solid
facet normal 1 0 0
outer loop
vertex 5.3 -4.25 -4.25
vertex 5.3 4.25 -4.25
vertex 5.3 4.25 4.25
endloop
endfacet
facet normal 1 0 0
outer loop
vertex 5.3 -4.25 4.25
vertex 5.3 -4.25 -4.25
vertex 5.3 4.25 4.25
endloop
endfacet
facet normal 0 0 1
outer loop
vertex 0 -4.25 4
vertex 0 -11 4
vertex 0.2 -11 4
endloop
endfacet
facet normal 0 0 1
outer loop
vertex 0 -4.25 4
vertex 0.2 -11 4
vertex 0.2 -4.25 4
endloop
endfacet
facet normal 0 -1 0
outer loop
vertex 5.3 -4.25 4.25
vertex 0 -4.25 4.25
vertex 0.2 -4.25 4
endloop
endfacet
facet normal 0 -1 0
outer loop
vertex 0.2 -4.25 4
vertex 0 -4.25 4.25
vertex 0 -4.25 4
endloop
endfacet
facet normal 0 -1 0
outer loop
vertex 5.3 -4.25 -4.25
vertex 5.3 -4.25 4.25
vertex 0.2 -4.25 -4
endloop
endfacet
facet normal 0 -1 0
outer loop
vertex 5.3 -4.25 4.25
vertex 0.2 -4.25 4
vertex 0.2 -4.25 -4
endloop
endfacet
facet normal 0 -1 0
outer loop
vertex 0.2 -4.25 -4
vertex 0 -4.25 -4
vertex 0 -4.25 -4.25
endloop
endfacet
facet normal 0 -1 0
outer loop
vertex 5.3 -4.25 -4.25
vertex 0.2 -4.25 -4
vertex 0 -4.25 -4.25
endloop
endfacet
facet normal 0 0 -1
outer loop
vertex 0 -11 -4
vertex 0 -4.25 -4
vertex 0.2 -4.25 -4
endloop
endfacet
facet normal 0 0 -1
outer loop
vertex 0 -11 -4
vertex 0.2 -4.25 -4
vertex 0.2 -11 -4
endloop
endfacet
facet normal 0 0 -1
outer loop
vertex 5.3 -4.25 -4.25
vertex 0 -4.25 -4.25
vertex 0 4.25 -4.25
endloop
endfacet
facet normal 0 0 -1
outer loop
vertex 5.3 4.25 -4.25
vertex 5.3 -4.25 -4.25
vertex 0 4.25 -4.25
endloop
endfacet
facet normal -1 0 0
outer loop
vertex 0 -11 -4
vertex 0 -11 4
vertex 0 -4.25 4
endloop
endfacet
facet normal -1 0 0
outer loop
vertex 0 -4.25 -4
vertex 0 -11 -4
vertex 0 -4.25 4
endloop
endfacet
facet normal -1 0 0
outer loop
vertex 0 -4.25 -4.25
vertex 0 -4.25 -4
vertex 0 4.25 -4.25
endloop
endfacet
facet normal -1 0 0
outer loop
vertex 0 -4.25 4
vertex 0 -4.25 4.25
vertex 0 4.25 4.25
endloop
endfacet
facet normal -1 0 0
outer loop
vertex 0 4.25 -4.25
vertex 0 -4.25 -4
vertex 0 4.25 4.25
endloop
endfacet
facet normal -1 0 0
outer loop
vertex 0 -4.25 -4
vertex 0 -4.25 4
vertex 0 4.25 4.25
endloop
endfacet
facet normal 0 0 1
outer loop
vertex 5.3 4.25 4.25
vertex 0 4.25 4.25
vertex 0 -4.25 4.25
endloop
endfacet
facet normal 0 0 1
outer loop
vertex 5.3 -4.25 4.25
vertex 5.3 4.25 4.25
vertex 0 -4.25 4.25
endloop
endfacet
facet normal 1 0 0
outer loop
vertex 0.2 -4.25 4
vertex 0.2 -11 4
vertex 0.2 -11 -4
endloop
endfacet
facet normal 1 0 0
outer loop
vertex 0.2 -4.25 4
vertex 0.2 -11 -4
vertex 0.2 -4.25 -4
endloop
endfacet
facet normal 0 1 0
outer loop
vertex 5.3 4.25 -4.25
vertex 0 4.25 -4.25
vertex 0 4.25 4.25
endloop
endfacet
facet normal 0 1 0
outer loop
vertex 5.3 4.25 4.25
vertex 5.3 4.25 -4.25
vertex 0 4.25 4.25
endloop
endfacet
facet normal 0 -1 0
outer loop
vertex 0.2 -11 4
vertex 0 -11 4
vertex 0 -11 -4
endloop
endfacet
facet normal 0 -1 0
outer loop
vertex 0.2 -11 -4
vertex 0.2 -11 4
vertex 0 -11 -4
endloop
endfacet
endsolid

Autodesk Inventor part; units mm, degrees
ref_plane "YZ Plane" through (0, 0, 0) normal (1, 0, 0) x (0, 1, 0)
ref_plane "XZ Plane" through (0, 0, 0) normal (0, 1, 0) x (-1, 0, 0)
ref_plane "XY Plane" through (0, 0, 0) normal (0, 0, 1) x (1, 0, 0)
sketch "Эскиз1" plane through (0, 0, 0) normal (1, 0, 0) x (0, 1, 0)
  line L0 (-7, 7) -> (7, 7)
  line L1 (7, 7) -> (7, -7)
  line L2 (7, -7) -> (-7, -7)
  line L3 (-7, -7) -> (-7, 7)
  line L4 (-7, 7) -> (7, -7) construction
  line L5 (7, 7) -> (-7, -7) construction
  line L6 (0, 9) -> (0, -9)
  circle A0 centre (0, -9) radius 2
  circle A1 centre (0, 9) radius 2
  line L7 (2, 9) -> (2, -9)
  line L8 (-2, -9) -> (-2, 9)
  line L9 (4.25, 4.25) -> (-4.25, 4.25)
  line L10 (-4.25, 4.25) -> (-4.25, -4.25)
  line L11 (-4.25, -4.25) -> (4.25, -4.25)
  line L12 (4.25, -4.25) -> (4.25, 4.25)
  line L13 (4.25, 4.25) -> (-4.25, -4.25) construction
  line L14 (-4.25, 4.25) -> (4.25, -4.25) construction
  line L15 (-7, 4) -> (-11, 4)
  line L16 (-11, 4) -> (-11, -4)
  line L17 (-11, -4) -> (-7, -4)
  line L18 (-7, -4) -> (-7, 4)
  circle A2 centre (0, 9) radius 1
  circle A3 centre (0, -9) radius 1
  line L19 (-7, 0) -> (-11, 0)
  line L20 (-7, 4) -> (-4.25, 4)
  line L21 (-4.25, 4) -> (-4.25, -4)
  line L22 (-4.25, -4) -> (-7, -4)
  line L23 (-7, -4) -> (-7, 4)
  point P0 (0, 0)
  point P1 (0, 0)
  point P2 (2, -7)
  point P3 (2, 7)
  point P4 (-2, 7)
  point P5 (-7, -4)
  point P6 (-2, -7)
  point P7 (-7, 0)
  dimension "d0" = 14
  dimension "d1" = 14
  dimension "d2" = 18
  dimension "d3" = 8.5
  dimension "d4" = 8.5
  dimension "d5" = 4
  dimension "d6" = 2
  dimension "d7" = 2
  dimension "d14" = 8
extrude "Выдавливание1" add sketch "Эскиз1" along normal blind 0.2 contours L20 L10 L22 L3 | L3 L19 L16 L15 | L9 L6 L11 L8 | L8 L11 L10 L9 | L3 L17 L16 L19 | L9 L7 L11 L6 | L9 L12 L11 L7
sketch "Эскиз2" plane through (0, 0, 0) normal (-1, 0, 0) x (0, 0, 1)
  line L0 (-4.25, 4.25) -> (4.25, 4.25)
  line L1 (4.25, 4.25) -> (4.25, -4.25)
  line L2 (4.25, -4.25) -> (-4.25, -4.25)
  line L3 (-4.25, -4.25) -> (-4.25, 4.25)
  line L4 (-4.25, 4.25) -> (4.25, -4.25) construction
  line L5 (4.25, 4.25) -> (-4.25, -4.25) construction
  point P0 (0, 0)
  dimension "d10" = 8.5
  dimension "d11" = 8.5
extrude "Выдавливание2" add sketch "Эскиз2" against normal blind 5.3
properties part number "imx258"
